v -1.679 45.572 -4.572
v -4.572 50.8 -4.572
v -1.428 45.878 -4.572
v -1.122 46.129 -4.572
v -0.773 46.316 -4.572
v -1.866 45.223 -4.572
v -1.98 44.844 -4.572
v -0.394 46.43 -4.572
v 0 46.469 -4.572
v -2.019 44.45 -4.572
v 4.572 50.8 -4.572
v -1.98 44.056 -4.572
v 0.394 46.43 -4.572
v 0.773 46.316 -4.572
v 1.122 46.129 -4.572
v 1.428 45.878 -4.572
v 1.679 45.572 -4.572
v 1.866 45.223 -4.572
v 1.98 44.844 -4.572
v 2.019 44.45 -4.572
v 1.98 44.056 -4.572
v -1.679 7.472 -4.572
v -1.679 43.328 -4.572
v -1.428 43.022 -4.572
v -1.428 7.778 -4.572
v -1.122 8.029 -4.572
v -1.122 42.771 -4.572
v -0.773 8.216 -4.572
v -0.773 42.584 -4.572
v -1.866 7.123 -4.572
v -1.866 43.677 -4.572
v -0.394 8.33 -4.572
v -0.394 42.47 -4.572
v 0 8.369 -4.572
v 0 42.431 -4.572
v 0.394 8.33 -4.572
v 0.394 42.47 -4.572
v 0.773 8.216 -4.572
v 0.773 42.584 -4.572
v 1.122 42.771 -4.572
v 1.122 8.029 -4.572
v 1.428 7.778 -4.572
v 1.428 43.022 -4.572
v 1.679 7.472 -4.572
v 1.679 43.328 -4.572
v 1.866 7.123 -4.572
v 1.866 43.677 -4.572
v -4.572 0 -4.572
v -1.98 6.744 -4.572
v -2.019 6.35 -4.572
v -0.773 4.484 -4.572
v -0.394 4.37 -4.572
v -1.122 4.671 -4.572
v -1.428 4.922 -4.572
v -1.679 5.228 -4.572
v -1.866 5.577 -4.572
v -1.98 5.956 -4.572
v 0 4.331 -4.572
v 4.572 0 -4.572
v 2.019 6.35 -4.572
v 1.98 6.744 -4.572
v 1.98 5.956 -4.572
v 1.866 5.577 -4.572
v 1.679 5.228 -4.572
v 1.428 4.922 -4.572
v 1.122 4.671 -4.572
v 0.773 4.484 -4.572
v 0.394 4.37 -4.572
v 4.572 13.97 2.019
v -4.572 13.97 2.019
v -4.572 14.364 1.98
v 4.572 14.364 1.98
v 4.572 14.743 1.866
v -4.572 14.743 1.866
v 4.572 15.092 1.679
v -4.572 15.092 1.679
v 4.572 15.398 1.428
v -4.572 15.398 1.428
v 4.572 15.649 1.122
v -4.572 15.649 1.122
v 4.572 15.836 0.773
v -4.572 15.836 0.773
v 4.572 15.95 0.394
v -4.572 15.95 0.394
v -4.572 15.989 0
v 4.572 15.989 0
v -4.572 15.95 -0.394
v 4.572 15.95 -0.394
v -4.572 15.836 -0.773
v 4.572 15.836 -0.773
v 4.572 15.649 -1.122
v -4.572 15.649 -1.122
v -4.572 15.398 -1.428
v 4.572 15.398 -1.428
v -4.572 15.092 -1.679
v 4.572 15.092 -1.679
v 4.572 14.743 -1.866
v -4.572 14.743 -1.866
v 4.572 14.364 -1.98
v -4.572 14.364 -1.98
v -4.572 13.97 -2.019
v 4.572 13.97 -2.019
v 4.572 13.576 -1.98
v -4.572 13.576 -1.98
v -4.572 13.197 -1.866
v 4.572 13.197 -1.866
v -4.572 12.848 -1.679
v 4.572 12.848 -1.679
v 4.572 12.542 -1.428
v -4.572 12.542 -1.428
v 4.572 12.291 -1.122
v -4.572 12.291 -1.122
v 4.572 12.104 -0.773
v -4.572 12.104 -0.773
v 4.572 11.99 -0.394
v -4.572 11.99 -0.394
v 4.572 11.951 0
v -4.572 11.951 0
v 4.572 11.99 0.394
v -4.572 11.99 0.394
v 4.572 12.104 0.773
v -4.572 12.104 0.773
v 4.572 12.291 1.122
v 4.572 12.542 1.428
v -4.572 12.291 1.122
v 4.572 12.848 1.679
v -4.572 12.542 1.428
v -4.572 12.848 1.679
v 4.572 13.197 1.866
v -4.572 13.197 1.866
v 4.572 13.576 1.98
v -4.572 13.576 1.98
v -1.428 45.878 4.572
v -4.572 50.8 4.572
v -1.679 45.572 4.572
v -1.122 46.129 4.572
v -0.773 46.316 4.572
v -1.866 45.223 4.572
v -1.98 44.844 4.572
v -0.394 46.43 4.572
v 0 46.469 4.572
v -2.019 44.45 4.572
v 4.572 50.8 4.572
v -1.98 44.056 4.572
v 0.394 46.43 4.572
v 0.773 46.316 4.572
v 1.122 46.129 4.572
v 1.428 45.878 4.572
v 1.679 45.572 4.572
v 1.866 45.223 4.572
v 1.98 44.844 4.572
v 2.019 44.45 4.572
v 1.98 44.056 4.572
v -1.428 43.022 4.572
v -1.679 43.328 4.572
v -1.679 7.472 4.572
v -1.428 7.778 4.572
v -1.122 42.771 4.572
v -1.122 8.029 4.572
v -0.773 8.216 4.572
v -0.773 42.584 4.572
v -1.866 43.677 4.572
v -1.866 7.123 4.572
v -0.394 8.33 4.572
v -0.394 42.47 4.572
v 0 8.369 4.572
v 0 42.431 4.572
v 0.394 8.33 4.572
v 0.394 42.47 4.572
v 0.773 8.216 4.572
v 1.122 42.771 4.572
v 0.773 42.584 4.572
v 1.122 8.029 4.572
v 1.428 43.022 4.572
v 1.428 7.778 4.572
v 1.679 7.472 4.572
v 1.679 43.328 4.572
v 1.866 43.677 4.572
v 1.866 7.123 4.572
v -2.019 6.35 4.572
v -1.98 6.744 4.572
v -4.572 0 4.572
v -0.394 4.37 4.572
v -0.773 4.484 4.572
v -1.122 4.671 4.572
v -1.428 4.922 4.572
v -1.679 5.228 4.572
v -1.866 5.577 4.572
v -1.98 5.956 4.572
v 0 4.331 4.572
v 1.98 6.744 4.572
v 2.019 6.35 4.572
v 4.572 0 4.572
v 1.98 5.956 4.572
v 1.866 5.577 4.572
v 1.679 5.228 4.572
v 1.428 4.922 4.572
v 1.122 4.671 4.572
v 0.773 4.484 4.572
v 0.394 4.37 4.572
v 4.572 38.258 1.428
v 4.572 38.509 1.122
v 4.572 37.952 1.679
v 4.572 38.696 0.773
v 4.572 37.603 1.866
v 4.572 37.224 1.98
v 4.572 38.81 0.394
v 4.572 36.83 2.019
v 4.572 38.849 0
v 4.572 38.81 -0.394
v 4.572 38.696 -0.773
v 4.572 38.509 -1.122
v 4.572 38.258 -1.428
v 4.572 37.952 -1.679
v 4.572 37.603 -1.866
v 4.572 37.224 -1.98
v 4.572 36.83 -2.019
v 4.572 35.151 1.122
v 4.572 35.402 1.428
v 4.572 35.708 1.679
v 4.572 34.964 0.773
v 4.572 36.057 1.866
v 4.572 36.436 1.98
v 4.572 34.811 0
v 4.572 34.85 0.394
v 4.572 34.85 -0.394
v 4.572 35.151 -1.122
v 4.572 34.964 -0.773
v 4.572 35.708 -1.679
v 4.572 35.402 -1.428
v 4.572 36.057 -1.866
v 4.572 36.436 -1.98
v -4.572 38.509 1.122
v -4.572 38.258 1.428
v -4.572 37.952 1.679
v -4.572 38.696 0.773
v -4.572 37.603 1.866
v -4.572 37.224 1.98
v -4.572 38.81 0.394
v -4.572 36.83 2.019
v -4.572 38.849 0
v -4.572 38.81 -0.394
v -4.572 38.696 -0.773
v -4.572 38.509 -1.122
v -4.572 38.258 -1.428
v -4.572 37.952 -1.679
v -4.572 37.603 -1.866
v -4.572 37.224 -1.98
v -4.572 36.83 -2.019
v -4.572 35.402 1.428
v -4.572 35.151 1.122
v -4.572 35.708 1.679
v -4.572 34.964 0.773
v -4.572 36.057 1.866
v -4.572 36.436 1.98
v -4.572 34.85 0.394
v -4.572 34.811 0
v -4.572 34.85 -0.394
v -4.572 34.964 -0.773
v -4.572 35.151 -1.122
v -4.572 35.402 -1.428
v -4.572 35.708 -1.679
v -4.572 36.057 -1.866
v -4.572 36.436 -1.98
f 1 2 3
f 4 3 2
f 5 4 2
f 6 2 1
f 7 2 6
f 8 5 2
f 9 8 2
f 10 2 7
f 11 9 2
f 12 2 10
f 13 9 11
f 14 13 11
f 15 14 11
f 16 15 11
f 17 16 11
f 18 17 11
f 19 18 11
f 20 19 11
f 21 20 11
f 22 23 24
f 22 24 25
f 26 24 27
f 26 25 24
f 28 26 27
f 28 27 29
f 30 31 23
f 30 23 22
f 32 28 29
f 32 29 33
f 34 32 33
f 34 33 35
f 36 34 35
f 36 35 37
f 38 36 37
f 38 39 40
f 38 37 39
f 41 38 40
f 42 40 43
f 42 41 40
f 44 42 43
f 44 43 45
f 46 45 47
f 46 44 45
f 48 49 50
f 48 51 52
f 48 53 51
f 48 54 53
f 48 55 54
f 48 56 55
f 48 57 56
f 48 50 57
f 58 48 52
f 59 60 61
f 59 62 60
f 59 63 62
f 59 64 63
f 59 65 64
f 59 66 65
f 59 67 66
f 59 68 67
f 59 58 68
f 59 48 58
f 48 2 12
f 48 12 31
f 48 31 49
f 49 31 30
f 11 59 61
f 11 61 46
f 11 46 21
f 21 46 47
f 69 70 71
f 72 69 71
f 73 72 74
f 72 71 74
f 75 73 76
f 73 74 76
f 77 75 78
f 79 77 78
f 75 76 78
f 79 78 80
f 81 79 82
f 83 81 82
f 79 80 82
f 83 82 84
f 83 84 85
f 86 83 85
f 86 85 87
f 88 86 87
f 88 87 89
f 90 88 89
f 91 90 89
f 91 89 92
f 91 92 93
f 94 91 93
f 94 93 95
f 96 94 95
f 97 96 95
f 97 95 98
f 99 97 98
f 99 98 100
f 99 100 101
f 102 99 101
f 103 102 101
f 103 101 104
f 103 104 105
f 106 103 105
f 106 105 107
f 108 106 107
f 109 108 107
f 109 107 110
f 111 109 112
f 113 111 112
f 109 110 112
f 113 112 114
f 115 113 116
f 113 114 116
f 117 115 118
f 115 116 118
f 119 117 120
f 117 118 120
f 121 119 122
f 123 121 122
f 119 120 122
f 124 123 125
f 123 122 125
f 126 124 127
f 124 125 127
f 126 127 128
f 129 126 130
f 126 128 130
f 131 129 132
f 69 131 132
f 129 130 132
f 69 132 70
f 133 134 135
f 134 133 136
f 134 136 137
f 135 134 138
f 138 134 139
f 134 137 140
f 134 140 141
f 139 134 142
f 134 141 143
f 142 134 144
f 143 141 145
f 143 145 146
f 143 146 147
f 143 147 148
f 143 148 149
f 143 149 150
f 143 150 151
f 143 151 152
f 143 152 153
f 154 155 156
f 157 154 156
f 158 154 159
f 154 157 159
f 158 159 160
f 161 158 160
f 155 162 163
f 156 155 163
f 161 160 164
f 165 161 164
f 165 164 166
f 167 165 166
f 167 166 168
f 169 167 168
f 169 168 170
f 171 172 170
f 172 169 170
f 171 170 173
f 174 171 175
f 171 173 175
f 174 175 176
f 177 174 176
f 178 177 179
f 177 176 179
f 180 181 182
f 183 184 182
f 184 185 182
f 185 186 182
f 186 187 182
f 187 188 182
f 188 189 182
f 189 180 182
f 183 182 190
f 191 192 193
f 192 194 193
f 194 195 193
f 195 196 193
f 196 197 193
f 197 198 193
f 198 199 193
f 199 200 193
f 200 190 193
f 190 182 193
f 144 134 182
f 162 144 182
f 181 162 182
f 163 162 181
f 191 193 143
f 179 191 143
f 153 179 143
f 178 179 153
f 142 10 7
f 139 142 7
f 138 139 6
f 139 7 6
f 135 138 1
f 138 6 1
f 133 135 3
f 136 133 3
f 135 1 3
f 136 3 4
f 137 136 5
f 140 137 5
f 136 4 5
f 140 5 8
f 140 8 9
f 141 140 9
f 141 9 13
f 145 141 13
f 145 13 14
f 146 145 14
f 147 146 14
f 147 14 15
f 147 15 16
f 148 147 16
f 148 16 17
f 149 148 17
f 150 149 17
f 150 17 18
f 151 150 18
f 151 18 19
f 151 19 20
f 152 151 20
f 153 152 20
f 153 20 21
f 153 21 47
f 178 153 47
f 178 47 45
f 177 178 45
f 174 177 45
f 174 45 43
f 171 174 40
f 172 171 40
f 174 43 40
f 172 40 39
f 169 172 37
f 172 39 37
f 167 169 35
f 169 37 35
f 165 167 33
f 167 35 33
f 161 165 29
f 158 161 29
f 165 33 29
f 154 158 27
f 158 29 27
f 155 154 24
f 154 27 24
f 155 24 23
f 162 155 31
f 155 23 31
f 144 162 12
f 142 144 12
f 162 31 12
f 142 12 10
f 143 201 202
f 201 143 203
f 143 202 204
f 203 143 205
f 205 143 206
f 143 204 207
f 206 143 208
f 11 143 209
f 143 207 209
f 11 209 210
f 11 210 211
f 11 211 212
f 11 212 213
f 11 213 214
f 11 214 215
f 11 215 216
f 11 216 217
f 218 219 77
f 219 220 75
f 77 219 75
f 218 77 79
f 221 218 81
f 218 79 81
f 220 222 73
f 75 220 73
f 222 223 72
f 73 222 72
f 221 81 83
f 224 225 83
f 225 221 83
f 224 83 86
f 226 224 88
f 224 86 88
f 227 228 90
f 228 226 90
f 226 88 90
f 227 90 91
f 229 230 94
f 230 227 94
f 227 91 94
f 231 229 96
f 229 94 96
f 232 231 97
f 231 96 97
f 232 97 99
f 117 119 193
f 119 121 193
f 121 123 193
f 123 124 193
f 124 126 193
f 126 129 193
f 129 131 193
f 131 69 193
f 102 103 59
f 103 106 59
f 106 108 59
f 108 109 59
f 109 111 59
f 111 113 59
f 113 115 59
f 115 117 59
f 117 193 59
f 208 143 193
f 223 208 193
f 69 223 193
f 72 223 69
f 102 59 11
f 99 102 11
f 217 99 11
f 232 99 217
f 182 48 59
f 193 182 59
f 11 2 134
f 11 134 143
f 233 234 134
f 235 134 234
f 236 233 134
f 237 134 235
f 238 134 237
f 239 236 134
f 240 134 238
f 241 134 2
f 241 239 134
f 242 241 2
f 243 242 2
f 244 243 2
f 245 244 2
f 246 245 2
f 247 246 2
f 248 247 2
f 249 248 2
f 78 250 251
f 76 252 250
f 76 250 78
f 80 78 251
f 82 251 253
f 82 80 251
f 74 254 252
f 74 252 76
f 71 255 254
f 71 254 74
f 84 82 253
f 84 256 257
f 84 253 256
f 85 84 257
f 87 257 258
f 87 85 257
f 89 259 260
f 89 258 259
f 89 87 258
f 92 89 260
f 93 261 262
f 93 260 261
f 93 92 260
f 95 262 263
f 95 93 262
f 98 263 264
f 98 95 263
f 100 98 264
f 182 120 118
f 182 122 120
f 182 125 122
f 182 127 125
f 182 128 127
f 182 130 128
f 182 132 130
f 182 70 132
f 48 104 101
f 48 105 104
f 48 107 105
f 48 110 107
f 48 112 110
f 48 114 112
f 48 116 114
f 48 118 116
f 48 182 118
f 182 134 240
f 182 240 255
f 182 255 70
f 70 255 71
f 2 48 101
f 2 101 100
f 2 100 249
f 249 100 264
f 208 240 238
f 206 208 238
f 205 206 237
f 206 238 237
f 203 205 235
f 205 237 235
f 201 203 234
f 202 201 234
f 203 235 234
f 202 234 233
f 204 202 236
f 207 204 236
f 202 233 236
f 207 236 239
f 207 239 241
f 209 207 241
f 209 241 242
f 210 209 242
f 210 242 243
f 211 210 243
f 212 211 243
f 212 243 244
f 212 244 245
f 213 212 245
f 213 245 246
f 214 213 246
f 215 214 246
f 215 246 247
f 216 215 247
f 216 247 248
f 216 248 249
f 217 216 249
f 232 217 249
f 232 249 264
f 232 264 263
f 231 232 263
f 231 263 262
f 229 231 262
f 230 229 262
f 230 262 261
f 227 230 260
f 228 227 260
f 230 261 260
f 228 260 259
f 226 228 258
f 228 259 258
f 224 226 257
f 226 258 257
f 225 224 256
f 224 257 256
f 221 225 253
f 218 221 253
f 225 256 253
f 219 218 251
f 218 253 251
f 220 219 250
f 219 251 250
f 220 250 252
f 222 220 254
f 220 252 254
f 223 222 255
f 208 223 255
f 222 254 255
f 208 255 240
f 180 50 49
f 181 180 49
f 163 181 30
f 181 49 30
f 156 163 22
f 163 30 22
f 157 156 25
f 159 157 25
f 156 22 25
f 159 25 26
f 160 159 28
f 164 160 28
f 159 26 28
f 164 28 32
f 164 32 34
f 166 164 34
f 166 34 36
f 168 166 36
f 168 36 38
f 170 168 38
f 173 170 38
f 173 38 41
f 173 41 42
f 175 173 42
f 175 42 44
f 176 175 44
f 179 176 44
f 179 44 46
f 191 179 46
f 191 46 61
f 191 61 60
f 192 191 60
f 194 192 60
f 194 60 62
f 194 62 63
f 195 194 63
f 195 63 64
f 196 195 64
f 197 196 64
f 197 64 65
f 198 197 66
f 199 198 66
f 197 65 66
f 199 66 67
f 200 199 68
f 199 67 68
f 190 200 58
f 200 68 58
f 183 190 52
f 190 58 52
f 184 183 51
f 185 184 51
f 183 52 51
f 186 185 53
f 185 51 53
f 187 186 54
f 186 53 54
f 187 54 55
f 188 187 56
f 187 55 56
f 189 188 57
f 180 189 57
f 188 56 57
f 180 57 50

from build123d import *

# Parameters (mm, degrees)
SKETCH1_W                  = 9.144
SKETCH1_H                  = 9.144
BOSS_EXTRUDE1_DEPTH        = 50.8
TAP_DRILL_FOR_10_32_TAP1_D = 4.0386
TAP_DRILL_FOR_10_32_TAP2_D = 4.0386


with BuildPart() as part:
    # Sketch1 → Boss-Extrude1 (new body)
    with BuildSketch(Plane(origin=(0, 0, 0), x_dir=(1, 0, 0), z_dir=(0, 1, 0))):
        Rectangle(SKETCH1_W, SKETCH1_H)
    extrude(amount=BOSS_EXTRUDE1_DEPTH)

    # Tap Drill for #10-32 Tap1 (through all)
    with Locations(Plane.XY.offset(4.572)):
        with Locations((0, 44.45), (0, 6.35)):
            Hole(TAP_DRILL_FOR_10_32_TAP1_D / 2)

    # Tap Drill for #10-32 Tap2 (through all)
    with Locations(Plane(origin=(4.572, 0, 0), x_dir=(0, 0, -1), z_dir=(1, 0, 0))):
        with Locations((0, 36.83), (0, 13.97)):
            Hole(TAP_DRILL_FOR_10_32_TAP2_D / 2)


solid = part.part
